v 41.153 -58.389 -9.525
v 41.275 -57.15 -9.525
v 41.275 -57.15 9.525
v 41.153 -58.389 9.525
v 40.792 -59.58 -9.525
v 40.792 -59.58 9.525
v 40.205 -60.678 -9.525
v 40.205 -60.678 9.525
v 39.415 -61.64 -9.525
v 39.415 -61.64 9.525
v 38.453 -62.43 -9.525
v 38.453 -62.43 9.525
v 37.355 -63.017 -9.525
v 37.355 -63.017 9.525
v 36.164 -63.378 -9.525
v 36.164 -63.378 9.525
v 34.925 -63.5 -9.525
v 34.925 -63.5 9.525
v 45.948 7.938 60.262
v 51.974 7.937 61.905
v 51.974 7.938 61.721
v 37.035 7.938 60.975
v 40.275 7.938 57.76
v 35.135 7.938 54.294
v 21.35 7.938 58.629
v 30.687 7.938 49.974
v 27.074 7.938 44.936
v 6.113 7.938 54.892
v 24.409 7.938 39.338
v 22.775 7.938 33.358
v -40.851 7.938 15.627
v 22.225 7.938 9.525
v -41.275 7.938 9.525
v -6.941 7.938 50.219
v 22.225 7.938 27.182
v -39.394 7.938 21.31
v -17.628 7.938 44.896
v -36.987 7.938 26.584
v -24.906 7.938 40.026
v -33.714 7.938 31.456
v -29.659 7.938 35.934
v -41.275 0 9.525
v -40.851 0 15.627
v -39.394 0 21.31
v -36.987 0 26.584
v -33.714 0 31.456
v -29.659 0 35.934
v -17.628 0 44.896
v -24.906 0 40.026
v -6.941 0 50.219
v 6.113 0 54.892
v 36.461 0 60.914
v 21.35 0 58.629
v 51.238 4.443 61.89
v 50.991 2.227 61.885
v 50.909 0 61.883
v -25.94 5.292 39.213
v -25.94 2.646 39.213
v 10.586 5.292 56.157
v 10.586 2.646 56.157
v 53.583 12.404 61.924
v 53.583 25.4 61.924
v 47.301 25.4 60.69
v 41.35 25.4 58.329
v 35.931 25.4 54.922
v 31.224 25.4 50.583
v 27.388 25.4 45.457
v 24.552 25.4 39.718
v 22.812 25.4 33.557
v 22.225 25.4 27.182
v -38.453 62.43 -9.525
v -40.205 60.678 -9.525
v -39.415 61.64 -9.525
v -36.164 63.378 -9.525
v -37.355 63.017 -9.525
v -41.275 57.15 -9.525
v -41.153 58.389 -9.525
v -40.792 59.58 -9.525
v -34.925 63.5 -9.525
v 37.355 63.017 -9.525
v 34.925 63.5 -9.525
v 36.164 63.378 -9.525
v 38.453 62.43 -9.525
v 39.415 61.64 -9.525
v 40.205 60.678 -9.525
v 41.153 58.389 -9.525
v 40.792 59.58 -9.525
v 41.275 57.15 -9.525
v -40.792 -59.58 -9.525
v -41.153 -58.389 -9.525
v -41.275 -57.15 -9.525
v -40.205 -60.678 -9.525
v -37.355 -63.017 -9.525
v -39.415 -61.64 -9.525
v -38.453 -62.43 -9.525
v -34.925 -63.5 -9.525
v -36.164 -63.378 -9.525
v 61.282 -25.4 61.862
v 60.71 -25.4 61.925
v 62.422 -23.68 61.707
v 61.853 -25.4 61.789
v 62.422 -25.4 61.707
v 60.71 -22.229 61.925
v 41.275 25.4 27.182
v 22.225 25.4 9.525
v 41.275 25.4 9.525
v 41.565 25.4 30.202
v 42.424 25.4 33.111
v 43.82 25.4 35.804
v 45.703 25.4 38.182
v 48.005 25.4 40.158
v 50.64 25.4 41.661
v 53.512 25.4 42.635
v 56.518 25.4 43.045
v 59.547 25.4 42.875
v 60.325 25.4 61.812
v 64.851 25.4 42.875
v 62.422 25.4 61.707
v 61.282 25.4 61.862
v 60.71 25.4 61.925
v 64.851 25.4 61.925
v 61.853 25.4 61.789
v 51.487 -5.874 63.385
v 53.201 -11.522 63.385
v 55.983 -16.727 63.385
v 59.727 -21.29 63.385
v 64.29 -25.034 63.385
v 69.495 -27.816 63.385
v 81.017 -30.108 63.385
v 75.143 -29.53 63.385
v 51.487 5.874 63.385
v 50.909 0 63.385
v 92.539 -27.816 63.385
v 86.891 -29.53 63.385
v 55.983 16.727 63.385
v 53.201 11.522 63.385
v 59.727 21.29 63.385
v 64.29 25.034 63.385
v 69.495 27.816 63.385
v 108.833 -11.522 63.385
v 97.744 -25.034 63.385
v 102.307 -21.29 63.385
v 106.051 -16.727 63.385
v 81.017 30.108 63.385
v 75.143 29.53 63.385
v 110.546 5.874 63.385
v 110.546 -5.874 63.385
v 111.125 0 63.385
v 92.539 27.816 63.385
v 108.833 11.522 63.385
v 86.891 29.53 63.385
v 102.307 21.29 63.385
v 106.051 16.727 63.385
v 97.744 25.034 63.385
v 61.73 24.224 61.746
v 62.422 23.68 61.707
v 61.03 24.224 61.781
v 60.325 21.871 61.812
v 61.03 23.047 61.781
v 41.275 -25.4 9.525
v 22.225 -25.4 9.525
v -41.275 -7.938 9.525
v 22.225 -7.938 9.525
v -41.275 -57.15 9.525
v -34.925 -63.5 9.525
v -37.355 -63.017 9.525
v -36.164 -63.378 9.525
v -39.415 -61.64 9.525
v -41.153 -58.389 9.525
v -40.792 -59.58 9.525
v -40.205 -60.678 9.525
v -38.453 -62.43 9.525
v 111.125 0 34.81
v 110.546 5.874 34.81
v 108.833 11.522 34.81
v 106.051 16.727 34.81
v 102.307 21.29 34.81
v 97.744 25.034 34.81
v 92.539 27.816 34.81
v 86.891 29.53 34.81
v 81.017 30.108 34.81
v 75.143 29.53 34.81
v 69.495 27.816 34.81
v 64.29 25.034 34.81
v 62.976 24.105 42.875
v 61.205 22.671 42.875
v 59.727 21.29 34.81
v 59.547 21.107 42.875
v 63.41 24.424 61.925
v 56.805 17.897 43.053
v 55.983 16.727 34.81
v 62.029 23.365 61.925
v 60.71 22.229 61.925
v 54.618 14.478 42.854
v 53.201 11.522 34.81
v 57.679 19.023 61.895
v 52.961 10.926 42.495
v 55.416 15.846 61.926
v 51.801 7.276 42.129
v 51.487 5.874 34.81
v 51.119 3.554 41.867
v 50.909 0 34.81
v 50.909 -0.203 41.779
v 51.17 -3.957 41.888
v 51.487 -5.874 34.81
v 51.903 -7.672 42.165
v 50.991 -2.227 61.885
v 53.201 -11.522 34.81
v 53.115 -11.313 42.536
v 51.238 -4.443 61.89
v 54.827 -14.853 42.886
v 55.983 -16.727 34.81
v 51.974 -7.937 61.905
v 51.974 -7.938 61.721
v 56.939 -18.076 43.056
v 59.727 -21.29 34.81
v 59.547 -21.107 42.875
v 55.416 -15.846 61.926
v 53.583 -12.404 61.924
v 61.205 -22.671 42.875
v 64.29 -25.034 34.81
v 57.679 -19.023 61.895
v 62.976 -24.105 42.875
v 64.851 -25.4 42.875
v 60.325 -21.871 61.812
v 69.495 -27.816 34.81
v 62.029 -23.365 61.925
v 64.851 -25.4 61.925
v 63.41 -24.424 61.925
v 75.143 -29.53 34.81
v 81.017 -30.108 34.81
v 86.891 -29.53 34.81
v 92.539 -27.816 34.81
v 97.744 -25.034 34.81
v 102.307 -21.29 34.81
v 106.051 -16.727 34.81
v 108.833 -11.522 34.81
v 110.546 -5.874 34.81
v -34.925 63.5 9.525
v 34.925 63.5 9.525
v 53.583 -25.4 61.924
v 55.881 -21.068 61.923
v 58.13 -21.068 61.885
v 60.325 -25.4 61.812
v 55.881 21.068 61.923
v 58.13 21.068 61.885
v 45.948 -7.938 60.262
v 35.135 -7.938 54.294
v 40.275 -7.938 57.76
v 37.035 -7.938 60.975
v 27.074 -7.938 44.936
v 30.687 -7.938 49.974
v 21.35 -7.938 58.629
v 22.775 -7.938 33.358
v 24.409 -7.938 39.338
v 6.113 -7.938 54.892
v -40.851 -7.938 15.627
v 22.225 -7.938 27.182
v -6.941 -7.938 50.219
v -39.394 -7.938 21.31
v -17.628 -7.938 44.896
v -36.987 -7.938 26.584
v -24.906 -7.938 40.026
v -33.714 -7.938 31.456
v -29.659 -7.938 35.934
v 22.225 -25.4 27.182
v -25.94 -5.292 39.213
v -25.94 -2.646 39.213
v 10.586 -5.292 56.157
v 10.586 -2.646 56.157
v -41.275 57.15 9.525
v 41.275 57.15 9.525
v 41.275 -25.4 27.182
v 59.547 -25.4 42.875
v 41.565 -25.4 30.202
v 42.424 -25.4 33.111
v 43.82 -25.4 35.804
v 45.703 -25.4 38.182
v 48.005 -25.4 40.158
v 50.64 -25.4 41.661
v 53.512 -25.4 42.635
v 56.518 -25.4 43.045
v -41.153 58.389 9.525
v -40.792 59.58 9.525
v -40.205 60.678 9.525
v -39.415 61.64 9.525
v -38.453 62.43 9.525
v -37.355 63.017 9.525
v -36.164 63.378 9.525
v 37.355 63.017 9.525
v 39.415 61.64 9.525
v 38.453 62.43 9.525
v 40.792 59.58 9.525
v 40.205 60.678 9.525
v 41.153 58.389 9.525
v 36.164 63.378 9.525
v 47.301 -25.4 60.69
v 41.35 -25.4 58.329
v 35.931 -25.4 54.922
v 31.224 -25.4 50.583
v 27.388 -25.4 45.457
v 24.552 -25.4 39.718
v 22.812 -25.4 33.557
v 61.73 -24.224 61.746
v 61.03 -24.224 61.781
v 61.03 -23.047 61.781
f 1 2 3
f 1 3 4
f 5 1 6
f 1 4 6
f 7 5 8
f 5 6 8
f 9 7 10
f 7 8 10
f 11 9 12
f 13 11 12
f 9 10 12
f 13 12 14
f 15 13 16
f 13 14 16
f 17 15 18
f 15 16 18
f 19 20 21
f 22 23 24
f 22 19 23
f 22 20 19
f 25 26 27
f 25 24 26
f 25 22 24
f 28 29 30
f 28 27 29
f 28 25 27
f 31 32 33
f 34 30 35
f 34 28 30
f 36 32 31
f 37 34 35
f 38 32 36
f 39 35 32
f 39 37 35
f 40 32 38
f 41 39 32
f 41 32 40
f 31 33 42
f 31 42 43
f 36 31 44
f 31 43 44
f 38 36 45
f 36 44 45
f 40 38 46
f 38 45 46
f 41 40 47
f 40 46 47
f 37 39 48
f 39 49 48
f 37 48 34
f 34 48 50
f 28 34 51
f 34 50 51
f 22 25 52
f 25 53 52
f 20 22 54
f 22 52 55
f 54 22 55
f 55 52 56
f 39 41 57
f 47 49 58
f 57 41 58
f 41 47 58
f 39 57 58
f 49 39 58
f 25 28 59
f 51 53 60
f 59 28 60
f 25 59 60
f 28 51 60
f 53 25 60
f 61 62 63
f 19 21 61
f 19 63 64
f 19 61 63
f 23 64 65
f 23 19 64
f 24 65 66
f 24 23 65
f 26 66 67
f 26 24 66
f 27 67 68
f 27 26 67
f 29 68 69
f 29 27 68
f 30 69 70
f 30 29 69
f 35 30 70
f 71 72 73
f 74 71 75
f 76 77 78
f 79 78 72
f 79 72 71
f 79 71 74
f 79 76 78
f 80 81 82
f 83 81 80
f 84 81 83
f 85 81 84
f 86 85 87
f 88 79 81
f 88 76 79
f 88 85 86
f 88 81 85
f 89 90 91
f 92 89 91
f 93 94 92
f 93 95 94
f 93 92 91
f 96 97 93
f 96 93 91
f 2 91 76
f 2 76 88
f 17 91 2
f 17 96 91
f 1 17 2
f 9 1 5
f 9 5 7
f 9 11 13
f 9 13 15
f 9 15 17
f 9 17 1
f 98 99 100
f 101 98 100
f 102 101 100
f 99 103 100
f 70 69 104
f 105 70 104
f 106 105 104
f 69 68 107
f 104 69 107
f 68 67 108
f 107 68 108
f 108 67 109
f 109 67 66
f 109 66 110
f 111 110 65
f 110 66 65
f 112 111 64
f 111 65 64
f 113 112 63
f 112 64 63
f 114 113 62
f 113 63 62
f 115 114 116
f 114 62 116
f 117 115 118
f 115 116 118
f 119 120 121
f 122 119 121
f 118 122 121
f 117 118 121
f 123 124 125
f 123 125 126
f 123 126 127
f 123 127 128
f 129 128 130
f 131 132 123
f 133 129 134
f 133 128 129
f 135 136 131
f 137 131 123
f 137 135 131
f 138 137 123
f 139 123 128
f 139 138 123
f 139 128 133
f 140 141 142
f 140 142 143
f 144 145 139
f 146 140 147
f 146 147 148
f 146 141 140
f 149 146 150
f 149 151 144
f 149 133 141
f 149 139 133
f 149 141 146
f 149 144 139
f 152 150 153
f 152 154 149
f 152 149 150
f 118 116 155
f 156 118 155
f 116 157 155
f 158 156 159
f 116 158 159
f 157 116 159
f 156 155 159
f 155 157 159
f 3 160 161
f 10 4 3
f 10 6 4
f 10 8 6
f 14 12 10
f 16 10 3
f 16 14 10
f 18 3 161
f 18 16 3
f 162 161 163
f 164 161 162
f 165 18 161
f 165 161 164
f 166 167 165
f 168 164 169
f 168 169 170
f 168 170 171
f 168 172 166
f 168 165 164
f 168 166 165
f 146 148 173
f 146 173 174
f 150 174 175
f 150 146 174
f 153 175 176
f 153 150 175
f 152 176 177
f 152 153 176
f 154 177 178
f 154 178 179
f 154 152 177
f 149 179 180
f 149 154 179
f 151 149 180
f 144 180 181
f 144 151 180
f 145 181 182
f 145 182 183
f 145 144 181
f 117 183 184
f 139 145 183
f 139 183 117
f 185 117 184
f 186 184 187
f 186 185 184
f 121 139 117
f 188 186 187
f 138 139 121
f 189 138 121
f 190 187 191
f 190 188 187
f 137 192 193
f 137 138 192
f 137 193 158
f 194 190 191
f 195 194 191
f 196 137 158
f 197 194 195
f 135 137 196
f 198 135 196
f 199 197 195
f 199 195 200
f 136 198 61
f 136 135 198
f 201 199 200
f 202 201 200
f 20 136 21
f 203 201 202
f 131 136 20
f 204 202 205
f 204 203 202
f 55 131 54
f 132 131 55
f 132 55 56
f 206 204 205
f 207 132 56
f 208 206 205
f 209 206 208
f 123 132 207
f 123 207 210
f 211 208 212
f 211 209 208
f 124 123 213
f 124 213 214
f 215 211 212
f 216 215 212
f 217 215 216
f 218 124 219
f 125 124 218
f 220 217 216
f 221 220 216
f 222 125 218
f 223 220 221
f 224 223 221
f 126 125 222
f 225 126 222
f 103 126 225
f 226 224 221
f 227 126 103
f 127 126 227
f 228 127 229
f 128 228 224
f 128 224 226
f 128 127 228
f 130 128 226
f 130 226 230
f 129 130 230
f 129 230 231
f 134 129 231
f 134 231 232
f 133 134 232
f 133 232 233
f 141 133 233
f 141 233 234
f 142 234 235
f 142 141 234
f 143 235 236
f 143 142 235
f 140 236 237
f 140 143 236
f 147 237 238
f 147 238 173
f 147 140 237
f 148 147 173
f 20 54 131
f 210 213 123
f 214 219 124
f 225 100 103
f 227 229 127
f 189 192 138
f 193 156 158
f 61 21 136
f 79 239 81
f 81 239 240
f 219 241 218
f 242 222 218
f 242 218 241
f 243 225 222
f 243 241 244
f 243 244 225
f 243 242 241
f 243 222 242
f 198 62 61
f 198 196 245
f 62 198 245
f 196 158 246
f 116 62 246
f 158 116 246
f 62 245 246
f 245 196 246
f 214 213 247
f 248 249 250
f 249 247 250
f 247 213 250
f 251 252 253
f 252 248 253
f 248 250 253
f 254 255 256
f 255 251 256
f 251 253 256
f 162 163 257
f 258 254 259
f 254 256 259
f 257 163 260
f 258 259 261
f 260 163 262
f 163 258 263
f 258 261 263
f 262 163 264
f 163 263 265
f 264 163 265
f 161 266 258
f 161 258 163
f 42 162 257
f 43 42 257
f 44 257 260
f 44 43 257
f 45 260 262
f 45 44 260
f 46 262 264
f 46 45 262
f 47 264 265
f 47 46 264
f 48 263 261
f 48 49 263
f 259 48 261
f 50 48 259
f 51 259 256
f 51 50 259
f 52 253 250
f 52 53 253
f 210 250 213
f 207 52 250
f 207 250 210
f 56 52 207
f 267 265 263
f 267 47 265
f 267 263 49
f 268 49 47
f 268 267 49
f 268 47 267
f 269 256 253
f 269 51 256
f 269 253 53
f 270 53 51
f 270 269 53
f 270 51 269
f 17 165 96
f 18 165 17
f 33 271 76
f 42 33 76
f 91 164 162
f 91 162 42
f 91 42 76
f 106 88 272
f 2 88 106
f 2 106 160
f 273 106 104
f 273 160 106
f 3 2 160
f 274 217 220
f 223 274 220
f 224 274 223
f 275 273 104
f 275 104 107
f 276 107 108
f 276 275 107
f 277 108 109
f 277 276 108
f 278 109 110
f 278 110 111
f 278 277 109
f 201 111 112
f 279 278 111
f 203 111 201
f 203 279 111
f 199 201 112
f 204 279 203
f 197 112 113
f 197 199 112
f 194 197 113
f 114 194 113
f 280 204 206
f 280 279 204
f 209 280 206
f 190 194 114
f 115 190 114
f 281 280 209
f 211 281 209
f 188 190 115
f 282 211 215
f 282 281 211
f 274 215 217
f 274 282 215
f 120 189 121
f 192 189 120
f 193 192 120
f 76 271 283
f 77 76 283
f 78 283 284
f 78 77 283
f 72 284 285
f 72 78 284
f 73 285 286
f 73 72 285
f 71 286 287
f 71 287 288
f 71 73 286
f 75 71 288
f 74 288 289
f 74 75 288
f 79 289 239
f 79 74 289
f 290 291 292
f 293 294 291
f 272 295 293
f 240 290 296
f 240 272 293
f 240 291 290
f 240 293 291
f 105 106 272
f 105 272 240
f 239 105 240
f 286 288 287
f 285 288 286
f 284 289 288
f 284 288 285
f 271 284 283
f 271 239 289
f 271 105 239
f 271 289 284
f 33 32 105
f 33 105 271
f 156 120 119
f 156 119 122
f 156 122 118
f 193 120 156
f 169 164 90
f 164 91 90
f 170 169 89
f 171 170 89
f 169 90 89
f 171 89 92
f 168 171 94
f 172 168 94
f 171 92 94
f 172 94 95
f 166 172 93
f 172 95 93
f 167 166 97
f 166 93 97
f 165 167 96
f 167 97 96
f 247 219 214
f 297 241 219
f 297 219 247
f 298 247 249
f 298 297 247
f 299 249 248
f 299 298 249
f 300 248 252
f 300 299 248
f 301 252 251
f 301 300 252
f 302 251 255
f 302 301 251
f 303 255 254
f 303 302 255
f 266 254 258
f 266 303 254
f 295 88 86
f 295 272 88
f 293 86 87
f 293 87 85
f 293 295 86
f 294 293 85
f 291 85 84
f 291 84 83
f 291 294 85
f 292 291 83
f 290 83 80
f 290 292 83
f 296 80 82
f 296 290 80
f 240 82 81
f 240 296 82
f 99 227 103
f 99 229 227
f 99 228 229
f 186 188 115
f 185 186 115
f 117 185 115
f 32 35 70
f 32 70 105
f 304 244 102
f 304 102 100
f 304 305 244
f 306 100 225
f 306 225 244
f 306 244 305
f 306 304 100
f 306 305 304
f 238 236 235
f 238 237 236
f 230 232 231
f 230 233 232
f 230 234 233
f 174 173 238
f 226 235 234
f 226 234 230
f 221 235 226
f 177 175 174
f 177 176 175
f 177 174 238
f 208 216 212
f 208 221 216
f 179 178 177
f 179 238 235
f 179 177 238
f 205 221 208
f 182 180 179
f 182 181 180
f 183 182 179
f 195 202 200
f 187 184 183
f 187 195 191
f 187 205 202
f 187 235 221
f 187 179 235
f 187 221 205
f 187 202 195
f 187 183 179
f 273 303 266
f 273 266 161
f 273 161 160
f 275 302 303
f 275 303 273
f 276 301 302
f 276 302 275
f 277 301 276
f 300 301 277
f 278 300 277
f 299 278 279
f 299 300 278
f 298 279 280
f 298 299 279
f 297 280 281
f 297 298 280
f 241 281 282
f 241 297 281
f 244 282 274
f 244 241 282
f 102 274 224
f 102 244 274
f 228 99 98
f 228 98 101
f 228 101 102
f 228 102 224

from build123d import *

# Parameters (mm, degrees)
F1_DEPTH = 63.5
F2_DEPTH = 25.4
F3_DEPTH = 7.9375
F5_R     = 6.35


with BuildPart() as f1:
    # F0 (on Front) → F1 (new body, symmetric)
    with BuildSketch(Plane.XZ):
        Polygon((22.2249999642, 9.525), (-41.275, 9.525), (-41.275, -9.525), (41.275, -9.525), (41.275, 9.525), align=None)
    extrude(amount=F1_DEPTH, both=True)

    # F0 (on Front) → F2 (join, symmetric)
    with BuildSketch(Plane.XZ):
        with BuildLine():
            Line((22.2249999642, 27.1821387616), (22.2249999642, 9.525))
            Line((22.2249999642, 9.525), (41.275, 9.525))
            Line((41.275, 9.525), (41.275, 27.1821387616))
            ThreePointArc((41.275, 27.1821387616), (46.8066352935, 39.2249968754), (59.5465504312, 42.8752))
            Line((59.5465504312, 42.8752), (60.325, 42.8752))
            Line((60.325, 42.8752), (60.325, 61.8121879463))
            add(Edge.make_bspline(
                [(53.5827816682, 61.924484406), (55.9043140785, 61.9405018001), (58.157358995, 61.9025346921), (60.325, 61.8121879463)],
                knots=[107.4684002997, 107.4684002997, 107.4684002997, 107.4684002997, 113.9637235604, 113.9637235604, 113.9637235604, 113.9637235604], degree=3))
            ThreePointArc((53.5827816682, 61.924484406), (31.2237514489, 50.5826785752), (22.2249999642, 27.1821387616))
        make_face()
        with BuildLine():
            add(Edge.make_bspline(
                [(60.325, 61.8121879463), (61.0334566794, 61.7826596455), (61.7327905274, 61.7475361607), (62.422410954, 61.7068735214)],
                knots=[113.9637235604, 113.9637235604, 113.9637235604, 113.9637235604, 116.0866097479, 116.0866097479, 116.0866097479, 116.0866097479], degree=3))
            Line((60.325, 61.8121879463), (60.325, 42.8752))
            Line((60.325, 42.8752), (81.01685845, 42.8752))
            Line((81.01685845, 42.8752), (81.01685845, 61.9251988828))
            Line((81.01685845, 61.9251988828), (60.7102529284, 61.9251988828))
            ThreePointArc((60.7102529284, 61.9251988828), (61.5676808741, 61.8266148465), (62.422410954, 61.7068735214))
        make_face()
    extrude(amount=F2_DEPTH, both=True)

    # F0 (on Front) → F3 (join, symmetric)
    with BuildSketch(Plane.XZ):
        with BuildLine():
            add(Edge.make_bspline(
                [(-41.275, 9.525), (-41.9877743947, 46.6159944116), (15.1718567055, 61.659468539), (53.5827816682, 61.924484406)],
                knots=[0, 0, 0, 0, 107.4684002997, 107.4684002997, 107.4684002997, 107.4684002997], degree=3))
            Line((-41.275, 9.525), (22.2249999642, 9.525))
            Line((22.2249999642, 9.525), (22.2249999642, 27.1821387616))
            ThreePointArc((22.2249999642, 27.1821387616), (31.2237514489, 50.5826785752), (53.5827816682, 61.924484406))
        make_face()
    extrude(amount=F3_DEPTH, both=True)

    # F0 (on Front) → F4 (revolve)
    with BuildSketch(Plane.XZ):
        Polygon((111.125, 63.3849346732), (81.01685845, 63.3849346732), (81.01685845, 61.9251988828), (81.01685845, 42.8752), (81.01685845, 34.8099346732), (111.125, 34.8099346732), align=None)
    revolve(axis=Axis((81.01685845, 0, 49.0974346732), (0, 0, 1)))

    # F5
    f5_edges = [f1.edges().sort_by_distance(p)[0] for p in [
        (-41.275, -63.5, 0),
        (41.275, -63.5, 0),
        (41.275, 63.5, 0),
        (-41.275, 63.5, 0),
    ]]
    fillet(f5_edges, radius=F5_R)


solid = f1.part
